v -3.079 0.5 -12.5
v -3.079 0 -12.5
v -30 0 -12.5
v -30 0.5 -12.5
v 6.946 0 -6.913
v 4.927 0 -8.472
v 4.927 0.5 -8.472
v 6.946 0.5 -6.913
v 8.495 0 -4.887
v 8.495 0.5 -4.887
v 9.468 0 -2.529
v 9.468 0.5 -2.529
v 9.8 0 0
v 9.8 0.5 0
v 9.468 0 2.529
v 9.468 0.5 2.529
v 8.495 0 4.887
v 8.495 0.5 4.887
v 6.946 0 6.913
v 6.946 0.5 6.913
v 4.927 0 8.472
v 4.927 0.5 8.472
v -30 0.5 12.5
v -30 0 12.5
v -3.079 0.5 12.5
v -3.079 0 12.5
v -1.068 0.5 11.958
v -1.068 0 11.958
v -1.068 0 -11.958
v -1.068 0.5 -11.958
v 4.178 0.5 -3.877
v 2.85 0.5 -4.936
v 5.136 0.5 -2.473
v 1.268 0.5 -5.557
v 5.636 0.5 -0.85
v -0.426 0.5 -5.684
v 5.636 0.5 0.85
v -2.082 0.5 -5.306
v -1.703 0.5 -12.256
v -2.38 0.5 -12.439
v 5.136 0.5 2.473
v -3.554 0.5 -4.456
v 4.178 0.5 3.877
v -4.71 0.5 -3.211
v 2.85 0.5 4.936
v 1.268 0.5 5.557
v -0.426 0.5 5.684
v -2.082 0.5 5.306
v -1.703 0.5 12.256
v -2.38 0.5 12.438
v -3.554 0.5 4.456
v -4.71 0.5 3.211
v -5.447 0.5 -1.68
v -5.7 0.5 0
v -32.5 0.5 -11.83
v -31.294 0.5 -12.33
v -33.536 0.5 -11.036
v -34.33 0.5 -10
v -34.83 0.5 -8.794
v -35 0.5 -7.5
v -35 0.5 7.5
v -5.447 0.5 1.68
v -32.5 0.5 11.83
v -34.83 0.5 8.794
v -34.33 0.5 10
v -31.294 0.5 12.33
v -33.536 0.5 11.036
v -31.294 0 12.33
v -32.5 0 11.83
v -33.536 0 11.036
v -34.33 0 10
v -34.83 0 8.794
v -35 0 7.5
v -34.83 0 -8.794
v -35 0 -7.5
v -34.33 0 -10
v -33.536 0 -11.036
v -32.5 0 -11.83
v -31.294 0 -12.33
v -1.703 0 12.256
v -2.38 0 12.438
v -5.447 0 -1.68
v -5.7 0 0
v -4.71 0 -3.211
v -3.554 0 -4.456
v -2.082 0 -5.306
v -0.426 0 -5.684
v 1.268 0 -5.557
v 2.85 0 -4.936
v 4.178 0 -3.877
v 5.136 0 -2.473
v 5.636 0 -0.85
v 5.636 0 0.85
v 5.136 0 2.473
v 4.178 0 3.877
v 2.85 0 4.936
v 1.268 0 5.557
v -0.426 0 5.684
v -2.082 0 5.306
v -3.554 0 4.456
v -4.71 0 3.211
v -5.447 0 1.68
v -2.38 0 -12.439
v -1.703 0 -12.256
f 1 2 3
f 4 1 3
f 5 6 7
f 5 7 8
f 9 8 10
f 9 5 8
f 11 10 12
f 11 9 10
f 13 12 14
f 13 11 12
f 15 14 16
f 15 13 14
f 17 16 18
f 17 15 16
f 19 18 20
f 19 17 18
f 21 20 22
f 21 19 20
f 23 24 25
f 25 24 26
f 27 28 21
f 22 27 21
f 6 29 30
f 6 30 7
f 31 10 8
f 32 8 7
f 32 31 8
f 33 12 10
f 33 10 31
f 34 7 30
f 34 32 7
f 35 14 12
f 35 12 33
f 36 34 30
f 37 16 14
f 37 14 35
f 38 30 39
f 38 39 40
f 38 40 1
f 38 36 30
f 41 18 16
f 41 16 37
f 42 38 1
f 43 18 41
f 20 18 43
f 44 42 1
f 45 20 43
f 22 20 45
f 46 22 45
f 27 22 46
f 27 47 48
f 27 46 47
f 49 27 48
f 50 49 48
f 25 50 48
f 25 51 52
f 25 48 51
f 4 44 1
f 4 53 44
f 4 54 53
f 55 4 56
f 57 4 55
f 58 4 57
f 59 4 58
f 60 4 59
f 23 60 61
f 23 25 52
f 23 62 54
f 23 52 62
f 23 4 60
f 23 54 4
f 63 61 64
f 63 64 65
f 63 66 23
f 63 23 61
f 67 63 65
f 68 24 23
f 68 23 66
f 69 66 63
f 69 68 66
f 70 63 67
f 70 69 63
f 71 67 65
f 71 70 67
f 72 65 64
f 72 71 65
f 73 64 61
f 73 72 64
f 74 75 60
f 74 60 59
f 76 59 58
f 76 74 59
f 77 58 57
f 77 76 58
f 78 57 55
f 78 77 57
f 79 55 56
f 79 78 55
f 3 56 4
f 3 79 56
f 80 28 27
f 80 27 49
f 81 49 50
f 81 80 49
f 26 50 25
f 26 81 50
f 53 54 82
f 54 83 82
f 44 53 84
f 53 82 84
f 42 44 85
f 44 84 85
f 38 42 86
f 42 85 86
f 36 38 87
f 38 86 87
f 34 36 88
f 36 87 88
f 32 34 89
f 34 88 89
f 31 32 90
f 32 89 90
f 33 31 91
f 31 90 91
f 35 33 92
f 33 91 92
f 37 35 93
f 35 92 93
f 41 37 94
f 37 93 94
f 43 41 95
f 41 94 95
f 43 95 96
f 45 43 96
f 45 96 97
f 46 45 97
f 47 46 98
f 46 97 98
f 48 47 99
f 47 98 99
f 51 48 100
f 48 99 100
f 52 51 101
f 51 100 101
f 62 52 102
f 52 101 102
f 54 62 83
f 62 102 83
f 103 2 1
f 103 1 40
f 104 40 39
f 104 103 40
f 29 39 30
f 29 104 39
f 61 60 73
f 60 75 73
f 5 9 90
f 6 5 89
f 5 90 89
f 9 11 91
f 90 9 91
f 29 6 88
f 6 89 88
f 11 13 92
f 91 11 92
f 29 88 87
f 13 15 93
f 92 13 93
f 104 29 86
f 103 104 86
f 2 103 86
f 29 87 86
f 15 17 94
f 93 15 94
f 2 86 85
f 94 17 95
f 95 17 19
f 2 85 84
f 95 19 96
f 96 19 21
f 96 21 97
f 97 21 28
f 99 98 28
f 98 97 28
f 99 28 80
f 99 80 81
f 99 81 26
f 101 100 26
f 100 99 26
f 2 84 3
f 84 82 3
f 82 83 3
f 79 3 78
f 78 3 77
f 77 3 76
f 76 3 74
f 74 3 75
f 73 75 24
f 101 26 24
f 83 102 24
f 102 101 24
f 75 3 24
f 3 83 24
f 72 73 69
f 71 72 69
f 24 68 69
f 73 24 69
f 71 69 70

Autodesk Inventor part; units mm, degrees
ref_plane "YZ Plane" through (0, 0, 0) normal (1, 0, 0) x (0, 1, 0)
ref_plane "XZ Plane" through (0, 0, 0) normal (0, 1, 0) x (-1, 0, 0)
ref_plane "XY Plane" through (0, 0, 0) normal (0, 0, 1) x (1, 0, 0)
sketch "Sketch1" plane through (0, 0, 0) normal (0, 1, 0) x (-1, 0, 0)
  circle A0 centre (0, 0) radius 5.7
  arc A1 (0, 9) -> (0, -9) centre (0, 0) ccw construction
  line L0 (0, 9) -> (12.65, 9) construction
  line L1 (12.65, 9) -> (12.65, -9) construction
  line L2 (0, 0) -> (0, -9) construction
  line L3 (3.0786, -12.5) -> (30, -12.5)
  line L4 (35, -7.5) -> (35, 7.5)
  line L5 (30, 12.5) -> (3.0786, 12.5)
  arc A2 (35, 7.5) -> (30, 12.5) centre (30, 7.5) ccw
  arc A3 (30, -12.5) -> (35, -7.5) centre (30, -7.5) ccw
  arc A4 (-4.9268, 8.4715) -> (-4.9268, -8.4715) centre (0, 0) ccw
  line L6 (1.0676, -11.9578) -> (-4.9268, -8.4715)
  line L7 (1.0676, 11.9578) -> (-4.9268, 8.4715)
  arc A5 (1.0676, -11.9578) -> (3.0786, -12.5) centre (3.0786, -8.5) ccw
  arc A6 (3.0786, 12.5) -> (1.0676, 11.9578) centre (3.0786, 8.5) ccw
  point P0 (35, -12.5)
  point P1 (35, 12.5)
  point P2 (2, -12.5)
  point P3 (2, 12.5)
  dimension "d0" = 11.4
  dimension "d1" = 9
  dimension "d2" = 12.65
  dimension "d5" = 25
  dimension "d6" = 5
  dimension "d10" = 25
  dimension "d11" = 19.6
  dimension "d12" = 4
extrude "Extrusion1" add sketch "Sketch1" along normal blind 0.5
properties part number "Laser-Pivot-Ringpull"
